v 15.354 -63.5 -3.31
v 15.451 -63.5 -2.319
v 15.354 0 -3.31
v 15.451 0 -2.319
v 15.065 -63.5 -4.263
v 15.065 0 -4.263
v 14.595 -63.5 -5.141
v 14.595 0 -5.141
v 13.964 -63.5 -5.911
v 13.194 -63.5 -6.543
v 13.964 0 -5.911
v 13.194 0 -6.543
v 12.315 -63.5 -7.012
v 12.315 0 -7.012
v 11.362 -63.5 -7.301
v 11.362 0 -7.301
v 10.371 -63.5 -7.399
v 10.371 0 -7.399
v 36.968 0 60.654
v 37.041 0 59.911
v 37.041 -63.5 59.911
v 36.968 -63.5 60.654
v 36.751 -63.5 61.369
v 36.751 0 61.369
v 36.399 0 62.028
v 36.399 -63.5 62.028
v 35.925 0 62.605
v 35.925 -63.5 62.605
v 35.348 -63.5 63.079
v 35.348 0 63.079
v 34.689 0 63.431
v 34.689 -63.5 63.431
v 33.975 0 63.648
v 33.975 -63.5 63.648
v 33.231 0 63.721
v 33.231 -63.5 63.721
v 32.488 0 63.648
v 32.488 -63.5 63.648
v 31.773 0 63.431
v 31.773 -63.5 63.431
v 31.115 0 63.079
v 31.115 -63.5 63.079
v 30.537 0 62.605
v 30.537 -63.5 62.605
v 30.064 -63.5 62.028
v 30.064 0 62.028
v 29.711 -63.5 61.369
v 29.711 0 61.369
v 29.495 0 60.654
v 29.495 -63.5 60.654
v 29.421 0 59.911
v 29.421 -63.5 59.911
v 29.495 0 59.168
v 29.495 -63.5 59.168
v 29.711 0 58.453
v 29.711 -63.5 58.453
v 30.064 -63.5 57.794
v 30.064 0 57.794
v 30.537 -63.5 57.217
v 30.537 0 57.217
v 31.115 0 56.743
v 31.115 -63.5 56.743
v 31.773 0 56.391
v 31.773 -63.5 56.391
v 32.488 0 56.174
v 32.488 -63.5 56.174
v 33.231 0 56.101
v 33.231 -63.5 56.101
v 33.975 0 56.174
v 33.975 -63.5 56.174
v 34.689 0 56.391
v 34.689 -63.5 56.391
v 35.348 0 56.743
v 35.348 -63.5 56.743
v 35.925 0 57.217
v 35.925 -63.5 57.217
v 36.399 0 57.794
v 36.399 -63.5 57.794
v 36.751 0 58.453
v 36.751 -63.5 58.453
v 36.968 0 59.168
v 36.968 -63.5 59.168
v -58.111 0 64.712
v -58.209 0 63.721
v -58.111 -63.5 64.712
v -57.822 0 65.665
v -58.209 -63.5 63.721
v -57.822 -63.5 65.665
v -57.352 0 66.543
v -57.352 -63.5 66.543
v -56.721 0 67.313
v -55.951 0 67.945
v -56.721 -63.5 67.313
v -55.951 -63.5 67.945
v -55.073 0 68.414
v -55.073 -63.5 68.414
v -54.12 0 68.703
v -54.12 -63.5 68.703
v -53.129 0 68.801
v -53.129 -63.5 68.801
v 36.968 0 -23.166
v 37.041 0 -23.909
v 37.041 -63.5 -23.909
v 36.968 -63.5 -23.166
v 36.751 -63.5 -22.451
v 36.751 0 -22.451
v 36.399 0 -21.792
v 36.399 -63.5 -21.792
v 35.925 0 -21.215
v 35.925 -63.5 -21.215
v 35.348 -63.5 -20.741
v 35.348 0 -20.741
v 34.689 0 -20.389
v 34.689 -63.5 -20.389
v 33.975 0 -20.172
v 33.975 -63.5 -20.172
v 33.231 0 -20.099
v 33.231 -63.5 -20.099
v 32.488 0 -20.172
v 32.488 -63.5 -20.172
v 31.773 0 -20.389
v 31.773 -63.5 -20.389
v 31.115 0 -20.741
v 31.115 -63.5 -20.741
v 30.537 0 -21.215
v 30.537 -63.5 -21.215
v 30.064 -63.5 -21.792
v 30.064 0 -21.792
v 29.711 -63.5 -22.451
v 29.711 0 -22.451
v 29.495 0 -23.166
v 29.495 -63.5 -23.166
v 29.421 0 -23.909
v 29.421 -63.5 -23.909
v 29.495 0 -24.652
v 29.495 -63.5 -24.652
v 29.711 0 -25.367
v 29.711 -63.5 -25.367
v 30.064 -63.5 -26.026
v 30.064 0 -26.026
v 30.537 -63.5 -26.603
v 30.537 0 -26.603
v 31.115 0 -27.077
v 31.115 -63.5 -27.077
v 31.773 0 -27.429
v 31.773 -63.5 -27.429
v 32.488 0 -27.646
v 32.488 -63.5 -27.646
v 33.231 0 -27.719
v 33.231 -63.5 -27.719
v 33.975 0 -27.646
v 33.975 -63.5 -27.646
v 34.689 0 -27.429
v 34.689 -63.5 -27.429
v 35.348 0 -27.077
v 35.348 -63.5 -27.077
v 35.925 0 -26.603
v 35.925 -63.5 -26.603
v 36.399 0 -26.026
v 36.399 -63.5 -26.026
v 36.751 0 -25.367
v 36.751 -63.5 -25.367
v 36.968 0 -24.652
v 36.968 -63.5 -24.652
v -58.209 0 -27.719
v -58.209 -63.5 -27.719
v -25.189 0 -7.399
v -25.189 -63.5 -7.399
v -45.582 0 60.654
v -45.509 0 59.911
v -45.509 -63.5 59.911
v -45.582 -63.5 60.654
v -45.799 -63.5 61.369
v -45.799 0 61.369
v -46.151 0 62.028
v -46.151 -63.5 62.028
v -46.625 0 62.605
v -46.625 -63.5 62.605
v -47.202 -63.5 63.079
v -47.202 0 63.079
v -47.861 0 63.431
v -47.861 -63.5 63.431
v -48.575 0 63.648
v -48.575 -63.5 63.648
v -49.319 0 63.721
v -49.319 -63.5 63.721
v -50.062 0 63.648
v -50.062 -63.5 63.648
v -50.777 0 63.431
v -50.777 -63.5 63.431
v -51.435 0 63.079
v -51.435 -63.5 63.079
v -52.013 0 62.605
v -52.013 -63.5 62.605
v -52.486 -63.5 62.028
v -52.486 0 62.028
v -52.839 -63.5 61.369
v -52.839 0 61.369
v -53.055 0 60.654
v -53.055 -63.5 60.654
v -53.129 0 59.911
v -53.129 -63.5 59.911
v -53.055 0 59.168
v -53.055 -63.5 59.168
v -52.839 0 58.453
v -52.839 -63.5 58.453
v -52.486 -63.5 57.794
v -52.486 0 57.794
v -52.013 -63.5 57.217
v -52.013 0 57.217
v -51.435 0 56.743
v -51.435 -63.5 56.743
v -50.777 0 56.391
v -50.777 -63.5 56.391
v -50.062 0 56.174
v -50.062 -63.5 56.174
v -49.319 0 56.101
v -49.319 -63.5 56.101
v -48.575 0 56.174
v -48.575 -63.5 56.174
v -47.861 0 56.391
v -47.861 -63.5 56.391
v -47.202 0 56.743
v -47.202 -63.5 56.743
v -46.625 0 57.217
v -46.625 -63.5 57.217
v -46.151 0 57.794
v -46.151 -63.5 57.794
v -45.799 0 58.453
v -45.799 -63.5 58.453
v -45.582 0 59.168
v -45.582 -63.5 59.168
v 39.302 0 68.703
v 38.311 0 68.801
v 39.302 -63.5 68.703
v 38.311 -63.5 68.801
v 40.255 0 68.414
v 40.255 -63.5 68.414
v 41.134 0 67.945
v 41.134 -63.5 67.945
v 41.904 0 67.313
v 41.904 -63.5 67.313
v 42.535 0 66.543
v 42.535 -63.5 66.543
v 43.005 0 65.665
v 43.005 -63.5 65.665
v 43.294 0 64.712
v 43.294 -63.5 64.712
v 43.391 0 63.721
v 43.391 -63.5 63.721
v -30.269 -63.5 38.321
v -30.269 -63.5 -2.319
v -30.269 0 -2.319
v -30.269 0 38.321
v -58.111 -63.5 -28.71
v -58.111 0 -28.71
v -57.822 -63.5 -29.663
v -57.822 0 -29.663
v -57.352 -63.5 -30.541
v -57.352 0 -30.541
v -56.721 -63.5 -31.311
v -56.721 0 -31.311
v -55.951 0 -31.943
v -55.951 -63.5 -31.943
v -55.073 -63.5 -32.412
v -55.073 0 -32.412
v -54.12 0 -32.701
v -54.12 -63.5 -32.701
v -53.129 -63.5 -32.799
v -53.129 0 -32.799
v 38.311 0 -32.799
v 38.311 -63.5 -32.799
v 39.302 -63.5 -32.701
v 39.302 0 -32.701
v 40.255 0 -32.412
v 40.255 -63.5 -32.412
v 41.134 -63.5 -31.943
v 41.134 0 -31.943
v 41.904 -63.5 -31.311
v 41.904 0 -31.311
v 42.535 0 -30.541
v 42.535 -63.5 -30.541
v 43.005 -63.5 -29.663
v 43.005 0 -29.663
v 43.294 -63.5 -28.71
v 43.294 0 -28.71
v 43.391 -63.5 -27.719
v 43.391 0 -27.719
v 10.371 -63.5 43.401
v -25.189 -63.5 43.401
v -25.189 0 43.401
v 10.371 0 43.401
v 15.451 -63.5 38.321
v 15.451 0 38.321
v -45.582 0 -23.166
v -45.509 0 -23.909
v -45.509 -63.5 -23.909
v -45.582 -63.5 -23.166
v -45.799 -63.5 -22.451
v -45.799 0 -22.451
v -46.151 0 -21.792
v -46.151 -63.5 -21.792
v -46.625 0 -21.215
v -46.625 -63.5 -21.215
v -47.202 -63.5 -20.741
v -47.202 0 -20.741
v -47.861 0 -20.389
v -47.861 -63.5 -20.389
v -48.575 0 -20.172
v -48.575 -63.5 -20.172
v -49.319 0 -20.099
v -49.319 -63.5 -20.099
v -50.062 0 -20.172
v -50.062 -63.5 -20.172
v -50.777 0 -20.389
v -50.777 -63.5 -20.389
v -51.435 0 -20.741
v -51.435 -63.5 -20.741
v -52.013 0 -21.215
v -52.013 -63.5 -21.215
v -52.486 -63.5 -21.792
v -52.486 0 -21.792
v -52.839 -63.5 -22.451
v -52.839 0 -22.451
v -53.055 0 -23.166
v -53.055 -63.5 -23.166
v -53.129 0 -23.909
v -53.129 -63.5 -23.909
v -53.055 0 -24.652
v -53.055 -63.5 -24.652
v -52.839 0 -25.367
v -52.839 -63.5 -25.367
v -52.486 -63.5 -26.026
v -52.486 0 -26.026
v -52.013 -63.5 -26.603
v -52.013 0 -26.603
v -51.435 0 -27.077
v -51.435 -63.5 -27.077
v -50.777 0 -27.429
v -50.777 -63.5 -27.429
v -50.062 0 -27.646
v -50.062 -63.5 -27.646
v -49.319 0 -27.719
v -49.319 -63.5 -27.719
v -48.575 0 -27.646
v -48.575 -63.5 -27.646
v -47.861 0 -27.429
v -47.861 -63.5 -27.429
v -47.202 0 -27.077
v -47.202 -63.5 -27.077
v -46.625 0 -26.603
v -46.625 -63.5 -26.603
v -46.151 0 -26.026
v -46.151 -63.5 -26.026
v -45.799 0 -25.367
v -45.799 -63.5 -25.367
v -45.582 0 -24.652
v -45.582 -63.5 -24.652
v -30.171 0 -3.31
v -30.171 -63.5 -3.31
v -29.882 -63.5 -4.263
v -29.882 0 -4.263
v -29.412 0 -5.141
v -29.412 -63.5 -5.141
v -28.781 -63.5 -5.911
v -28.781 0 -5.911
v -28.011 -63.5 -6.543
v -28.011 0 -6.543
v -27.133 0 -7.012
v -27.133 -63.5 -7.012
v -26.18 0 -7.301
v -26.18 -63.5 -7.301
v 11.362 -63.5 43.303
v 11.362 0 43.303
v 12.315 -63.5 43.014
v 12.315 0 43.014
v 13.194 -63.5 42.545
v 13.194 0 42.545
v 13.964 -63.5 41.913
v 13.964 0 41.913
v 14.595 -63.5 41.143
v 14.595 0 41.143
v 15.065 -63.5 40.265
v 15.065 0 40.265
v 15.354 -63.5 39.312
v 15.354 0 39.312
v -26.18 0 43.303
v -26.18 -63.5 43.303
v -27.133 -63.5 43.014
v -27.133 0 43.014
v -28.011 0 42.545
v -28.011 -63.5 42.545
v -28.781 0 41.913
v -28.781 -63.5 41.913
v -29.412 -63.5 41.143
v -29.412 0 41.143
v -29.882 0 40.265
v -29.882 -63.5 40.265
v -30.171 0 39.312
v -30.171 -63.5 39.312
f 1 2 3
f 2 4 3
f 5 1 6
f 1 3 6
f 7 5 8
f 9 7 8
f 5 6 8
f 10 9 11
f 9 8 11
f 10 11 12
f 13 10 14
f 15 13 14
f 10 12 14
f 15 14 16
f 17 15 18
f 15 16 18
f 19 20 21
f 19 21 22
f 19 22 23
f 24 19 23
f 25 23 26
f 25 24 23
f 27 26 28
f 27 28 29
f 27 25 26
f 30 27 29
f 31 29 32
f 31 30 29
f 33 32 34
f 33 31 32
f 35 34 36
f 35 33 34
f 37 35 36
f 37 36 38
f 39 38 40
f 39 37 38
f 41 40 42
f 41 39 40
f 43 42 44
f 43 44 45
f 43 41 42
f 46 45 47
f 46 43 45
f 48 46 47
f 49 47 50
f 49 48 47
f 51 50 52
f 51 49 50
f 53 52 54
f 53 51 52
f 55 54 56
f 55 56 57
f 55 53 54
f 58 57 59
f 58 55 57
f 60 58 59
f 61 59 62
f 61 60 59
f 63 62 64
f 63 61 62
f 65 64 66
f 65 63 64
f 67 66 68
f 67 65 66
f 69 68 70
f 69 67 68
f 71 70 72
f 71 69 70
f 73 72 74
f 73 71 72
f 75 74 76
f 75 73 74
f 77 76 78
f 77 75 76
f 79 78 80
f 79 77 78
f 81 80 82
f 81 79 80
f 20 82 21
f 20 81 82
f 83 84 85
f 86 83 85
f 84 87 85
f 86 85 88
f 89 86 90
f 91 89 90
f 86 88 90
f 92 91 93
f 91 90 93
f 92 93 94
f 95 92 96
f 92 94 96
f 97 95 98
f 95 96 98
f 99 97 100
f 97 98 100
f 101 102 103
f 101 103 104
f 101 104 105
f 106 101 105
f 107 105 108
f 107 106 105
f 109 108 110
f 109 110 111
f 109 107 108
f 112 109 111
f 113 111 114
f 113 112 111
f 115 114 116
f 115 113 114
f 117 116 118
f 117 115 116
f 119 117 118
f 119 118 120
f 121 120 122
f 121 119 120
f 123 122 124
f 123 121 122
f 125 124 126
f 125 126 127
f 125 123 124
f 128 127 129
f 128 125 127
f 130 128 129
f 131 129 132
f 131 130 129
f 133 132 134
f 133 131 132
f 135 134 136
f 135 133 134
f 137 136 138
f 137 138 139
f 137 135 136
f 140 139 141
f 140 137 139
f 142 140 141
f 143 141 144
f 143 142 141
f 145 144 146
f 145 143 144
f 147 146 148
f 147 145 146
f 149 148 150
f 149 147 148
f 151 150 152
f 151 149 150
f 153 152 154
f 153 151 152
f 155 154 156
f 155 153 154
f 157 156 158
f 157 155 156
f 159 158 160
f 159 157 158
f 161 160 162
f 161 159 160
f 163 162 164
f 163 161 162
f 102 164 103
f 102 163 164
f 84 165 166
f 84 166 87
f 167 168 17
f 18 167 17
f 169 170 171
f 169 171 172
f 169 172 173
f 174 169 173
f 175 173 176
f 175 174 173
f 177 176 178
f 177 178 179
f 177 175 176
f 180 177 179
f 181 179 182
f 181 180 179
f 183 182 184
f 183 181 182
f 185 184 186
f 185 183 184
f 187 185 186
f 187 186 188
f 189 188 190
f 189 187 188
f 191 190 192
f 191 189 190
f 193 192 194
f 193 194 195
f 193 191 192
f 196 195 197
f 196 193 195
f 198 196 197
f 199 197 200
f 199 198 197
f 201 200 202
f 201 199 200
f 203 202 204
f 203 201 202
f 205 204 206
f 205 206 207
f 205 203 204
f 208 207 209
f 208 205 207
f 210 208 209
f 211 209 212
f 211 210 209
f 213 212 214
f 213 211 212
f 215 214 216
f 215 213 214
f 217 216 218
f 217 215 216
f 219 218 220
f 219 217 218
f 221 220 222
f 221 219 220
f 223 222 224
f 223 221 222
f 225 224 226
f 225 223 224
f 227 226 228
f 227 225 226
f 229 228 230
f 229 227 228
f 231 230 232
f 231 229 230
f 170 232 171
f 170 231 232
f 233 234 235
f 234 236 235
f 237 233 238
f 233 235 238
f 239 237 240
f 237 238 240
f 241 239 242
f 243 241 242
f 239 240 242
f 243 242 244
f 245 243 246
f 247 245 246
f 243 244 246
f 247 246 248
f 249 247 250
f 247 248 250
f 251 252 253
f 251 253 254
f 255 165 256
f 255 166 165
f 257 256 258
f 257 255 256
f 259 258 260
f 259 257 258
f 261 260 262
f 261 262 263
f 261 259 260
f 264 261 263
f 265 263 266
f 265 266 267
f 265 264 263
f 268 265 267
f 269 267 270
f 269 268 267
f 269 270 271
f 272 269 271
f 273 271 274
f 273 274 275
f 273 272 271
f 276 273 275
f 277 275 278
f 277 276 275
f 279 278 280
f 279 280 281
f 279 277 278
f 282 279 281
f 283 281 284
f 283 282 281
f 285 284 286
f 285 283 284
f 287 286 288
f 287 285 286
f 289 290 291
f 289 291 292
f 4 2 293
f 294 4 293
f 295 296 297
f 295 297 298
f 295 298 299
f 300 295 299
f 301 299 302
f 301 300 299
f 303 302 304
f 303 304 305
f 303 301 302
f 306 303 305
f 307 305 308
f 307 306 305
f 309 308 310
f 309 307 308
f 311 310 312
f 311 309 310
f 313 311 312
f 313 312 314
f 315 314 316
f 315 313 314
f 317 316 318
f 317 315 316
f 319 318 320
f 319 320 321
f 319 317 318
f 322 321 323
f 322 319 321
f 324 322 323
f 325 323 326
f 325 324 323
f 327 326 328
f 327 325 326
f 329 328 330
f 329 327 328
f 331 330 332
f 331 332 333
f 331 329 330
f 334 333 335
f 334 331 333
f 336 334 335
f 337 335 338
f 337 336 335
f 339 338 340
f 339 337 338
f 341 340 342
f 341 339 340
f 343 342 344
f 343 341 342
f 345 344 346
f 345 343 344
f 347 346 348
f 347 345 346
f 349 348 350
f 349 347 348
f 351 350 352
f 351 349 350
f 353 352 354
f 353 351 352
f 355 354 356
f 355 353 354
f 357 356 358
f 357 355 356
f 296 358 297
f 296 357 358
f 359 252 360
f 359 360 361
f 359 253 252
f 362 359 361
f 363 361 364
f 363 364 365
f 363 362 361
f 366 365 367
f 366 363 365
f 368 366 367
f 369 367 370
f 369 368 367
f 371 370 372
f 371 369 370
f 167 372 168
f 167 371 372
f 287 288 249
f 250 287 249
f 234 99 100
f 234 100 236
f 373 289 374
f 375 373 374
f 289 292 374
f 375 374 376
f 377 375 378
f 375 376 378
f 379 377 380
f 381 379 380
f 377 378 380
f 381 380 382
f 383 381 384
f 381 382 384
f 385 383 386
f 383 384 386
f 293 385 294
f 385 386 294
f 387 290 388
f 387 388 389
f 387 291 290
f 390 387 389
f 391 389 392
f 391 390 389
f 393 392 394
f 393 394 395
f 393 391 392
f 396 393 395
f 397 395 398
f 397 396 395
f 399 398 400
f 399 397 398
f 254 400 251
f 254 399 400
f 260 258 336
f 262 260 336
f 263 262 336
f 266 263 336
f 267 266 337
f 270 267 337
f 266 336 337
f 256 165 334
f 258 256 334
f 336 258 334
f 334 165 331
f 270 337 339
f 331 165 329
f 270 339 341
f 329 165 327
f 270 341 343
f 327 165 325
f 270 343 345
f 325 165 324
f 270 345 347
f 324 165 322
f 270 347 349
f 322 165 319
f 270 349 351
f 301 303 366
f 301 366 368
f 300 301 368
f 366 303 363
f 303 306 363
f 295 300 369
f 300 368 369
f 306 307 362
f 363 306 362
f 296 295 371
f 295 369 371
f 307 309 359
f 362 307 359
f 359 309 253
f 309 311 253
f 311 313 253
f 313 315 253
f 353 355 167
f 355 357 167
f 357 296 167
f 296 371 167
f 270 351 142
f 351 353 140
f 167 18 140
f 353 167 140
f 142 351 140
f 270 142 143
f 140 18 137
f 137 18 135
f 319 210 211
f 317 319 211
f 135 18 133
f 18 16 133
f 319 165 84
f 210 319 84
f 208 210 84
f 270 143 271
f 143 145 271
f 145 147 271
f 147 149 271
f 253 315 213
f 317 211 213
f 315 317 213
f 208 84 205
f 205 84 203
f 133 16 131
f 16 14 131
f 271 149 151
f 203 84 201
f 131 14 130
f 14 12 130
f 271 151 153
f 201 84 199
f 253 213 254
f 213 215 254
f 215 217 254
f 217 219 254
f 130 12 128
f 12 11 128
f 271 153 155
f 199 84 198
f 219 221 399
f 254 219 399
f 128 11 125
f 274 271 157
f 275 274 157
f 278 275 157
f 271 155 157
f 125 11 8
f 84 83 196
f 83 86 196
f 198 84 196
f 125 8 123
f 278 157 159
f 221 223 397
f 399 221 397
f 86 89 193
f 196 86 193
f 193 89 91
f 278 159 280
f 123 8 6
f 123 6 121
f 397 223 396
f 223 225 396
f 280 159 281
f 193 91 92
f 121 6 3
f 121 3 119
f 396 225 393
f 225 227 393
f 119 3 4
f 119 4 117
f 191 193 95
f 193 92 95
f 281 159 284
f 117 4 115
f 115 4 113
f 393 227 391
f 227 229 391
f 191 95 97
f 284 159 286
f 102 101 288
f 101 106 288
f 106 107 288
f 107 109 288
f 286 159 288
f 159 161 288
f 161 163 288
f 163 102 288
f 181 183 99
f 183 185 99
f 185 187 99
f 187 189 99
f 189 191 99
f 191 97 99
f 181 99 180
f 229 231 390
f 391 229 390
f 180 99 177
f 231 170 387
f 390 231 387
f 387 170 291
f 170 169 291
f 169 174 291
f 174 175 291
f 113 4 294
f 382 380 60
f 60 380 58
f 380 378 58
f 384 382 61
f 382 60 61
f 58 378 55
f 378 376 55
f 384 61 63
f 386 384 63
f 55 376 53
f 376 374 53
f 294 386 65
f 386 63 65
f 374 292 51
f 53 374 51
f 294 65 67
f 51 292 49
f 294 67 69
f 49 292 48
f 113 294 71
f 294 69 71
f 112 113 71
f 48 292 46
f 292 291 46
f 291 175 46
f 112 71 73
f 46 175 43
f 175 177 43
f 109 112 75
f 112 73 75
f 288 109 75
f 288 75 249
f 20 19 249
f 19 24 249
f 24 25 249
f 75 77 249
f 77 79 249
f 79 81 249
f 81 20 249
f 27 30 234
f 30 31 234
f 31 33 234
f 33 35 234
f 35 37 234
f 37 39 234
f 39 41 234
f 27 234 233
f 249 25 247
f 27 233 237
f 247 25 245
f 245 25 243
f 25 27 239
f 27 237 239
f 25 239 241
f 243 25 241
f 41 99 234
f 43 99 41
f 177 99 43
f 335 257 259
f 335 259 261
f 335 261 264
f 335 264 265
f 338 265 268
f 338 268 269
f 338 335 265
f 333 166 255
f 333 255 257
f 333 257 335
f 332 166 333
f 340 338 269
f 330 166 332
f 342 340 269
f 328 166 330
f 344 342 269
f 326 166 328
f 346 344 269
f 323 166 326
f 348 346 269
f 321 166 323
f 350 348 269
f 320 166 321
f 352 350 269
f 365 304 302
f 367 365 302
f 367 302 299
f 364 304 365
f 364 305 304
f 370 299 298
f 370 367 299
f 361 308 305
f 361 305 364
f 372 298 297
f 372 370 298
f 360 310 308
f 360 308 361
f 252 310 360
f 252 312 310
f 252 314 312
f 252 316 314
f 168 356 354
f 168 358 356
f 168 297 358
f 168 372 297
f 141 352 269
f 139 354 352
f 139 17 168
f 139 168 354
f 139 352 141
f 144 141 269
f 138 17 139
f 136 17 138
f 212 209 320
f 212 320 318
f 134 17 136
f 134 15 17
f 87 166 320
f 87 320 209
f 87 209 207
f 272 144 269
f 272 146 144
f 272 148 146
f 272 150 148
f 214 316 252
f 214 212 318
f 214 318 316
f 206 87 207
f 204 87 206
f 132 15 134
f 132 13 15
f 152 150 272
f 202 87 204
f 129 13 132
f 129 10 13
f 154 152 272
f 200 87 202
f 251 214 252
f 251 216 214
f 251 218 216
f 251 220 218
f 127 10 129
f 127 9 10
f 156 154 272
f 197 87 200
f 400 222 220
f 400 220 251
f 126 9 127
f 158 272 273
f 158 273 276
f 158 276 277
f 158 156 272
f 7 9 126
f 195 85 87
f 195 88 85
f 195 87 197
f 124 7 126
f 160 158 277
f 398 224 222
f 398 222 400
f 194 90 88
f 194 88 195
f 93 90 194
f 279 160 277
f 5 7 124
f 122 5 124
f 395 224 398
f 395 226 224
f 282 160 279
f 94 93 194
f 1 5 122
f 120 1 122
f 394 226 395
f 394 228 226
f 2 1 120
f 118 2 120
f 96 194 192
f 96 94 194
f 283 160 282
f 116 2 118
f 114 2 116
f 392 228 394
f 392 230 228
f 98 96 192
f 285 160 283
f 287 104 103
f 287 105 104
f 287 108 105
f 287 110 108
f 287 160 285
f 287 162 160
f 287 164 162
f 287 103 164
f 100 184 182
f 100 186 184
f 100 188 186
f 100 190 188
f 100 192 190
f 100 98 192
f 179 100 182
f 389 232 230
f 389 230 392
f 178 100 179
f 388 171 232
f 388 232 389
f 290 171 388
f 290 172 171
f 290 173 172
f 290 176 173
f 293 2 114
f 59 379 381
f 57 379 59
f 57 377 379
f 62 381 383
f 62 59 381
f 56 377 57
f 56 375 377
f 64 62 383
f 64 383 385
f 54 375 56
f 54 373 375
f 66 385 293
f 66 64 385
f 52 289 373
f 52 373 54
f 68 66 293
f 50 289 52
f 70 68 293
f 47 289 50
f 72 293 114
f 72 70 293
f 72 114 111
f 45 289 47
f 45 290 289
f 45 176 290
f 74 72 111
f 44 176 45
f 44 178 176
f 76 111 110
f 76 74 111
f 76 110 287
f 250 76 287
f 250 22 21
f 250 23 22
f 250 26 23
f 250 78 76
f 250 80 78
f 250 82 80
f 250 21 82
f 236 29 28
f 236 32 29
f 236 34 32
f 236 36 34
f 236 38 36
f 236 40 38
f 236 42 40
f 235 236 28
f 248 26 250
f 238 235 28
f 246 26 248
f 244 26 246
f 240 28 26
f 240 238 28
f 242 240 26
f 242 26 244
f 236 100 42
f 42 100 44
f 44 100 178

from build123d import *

# Parameters (mm, degrees)
F0_W     = 101.6
F0_H     = 101.6
F0_R     = 3.81
F1_DEPTH = 63.5
F2_W     = 45.72
F2_H     = 50.8
F3_DEPTH = 63.5
F4_R     = 5.08
F5_R     = 5.08
F6_R     = 5.08


with BuildPart() as f1:
    # F0 (on Front) → F1 (new body)
    with BuildSketch(Plane.XZ):
        with Locations((-7.408589, 18.000908)):
            Rectangle(F0_W, F0_H)
        with Locations((-49.318589, -23.909092)):
            Circle(F0_R, mode=Mode.SUBTRACT)
        with Locations((33.231411, -23.909092)):
            Circle(F0_R, mode=Mode.SUBTRACT)
        with Locations((-49.318589, 59.910908)):
            Circle(F0_R, mode=Mode.SUBTRACT)
        with Locations((33.231411, 59.910908)):
            Circle(F0_R, mode=Mode.SUBTRACT)
    extrude(amount=F1_DEPTH)

    # F2 (on face) → F3 (cut)
    with BuildSketch(Plane.XZ.offset(63.5)):
        with Locations((-7.408589, 18.000908)):
            Rectangle(F2_W, F2_H)
    extrude(amount=-F3_DEPTH, mode=Mode.SUBTRACT)

    # F4
    f4_edges = [f1.edges().sort_by_distance(p)[0] for p in [
        (-58.208589, -31.75, 68.800908),
        (-58.208589, -31.75, -32.799092),
        (43.391411, -31.75, -32.799092),
        (43.391411, -31.75, 68.800908),
    ]]
    fillet(f4_edges, radius=F4_R)

    # F5
    f5_edges = [f1.edges().sort_by_distance(p)[0] for p in [
        (-30.268589, -31.75, 43.400908),
    ]]
    fillet(f5_edges, radius=F5_R)

    # F6
    f6_edges = [f1.edges().sort_by_distance(p)[0] for p in [
        (-30.268589, -31.75, -7.399092),
        (15.451411, -31.75, 43.400908),
        (15.451411, -31.75, -7.399092),
    ]]
    fillet(f6_edges, radius=F6_R)


solid = f1.part
